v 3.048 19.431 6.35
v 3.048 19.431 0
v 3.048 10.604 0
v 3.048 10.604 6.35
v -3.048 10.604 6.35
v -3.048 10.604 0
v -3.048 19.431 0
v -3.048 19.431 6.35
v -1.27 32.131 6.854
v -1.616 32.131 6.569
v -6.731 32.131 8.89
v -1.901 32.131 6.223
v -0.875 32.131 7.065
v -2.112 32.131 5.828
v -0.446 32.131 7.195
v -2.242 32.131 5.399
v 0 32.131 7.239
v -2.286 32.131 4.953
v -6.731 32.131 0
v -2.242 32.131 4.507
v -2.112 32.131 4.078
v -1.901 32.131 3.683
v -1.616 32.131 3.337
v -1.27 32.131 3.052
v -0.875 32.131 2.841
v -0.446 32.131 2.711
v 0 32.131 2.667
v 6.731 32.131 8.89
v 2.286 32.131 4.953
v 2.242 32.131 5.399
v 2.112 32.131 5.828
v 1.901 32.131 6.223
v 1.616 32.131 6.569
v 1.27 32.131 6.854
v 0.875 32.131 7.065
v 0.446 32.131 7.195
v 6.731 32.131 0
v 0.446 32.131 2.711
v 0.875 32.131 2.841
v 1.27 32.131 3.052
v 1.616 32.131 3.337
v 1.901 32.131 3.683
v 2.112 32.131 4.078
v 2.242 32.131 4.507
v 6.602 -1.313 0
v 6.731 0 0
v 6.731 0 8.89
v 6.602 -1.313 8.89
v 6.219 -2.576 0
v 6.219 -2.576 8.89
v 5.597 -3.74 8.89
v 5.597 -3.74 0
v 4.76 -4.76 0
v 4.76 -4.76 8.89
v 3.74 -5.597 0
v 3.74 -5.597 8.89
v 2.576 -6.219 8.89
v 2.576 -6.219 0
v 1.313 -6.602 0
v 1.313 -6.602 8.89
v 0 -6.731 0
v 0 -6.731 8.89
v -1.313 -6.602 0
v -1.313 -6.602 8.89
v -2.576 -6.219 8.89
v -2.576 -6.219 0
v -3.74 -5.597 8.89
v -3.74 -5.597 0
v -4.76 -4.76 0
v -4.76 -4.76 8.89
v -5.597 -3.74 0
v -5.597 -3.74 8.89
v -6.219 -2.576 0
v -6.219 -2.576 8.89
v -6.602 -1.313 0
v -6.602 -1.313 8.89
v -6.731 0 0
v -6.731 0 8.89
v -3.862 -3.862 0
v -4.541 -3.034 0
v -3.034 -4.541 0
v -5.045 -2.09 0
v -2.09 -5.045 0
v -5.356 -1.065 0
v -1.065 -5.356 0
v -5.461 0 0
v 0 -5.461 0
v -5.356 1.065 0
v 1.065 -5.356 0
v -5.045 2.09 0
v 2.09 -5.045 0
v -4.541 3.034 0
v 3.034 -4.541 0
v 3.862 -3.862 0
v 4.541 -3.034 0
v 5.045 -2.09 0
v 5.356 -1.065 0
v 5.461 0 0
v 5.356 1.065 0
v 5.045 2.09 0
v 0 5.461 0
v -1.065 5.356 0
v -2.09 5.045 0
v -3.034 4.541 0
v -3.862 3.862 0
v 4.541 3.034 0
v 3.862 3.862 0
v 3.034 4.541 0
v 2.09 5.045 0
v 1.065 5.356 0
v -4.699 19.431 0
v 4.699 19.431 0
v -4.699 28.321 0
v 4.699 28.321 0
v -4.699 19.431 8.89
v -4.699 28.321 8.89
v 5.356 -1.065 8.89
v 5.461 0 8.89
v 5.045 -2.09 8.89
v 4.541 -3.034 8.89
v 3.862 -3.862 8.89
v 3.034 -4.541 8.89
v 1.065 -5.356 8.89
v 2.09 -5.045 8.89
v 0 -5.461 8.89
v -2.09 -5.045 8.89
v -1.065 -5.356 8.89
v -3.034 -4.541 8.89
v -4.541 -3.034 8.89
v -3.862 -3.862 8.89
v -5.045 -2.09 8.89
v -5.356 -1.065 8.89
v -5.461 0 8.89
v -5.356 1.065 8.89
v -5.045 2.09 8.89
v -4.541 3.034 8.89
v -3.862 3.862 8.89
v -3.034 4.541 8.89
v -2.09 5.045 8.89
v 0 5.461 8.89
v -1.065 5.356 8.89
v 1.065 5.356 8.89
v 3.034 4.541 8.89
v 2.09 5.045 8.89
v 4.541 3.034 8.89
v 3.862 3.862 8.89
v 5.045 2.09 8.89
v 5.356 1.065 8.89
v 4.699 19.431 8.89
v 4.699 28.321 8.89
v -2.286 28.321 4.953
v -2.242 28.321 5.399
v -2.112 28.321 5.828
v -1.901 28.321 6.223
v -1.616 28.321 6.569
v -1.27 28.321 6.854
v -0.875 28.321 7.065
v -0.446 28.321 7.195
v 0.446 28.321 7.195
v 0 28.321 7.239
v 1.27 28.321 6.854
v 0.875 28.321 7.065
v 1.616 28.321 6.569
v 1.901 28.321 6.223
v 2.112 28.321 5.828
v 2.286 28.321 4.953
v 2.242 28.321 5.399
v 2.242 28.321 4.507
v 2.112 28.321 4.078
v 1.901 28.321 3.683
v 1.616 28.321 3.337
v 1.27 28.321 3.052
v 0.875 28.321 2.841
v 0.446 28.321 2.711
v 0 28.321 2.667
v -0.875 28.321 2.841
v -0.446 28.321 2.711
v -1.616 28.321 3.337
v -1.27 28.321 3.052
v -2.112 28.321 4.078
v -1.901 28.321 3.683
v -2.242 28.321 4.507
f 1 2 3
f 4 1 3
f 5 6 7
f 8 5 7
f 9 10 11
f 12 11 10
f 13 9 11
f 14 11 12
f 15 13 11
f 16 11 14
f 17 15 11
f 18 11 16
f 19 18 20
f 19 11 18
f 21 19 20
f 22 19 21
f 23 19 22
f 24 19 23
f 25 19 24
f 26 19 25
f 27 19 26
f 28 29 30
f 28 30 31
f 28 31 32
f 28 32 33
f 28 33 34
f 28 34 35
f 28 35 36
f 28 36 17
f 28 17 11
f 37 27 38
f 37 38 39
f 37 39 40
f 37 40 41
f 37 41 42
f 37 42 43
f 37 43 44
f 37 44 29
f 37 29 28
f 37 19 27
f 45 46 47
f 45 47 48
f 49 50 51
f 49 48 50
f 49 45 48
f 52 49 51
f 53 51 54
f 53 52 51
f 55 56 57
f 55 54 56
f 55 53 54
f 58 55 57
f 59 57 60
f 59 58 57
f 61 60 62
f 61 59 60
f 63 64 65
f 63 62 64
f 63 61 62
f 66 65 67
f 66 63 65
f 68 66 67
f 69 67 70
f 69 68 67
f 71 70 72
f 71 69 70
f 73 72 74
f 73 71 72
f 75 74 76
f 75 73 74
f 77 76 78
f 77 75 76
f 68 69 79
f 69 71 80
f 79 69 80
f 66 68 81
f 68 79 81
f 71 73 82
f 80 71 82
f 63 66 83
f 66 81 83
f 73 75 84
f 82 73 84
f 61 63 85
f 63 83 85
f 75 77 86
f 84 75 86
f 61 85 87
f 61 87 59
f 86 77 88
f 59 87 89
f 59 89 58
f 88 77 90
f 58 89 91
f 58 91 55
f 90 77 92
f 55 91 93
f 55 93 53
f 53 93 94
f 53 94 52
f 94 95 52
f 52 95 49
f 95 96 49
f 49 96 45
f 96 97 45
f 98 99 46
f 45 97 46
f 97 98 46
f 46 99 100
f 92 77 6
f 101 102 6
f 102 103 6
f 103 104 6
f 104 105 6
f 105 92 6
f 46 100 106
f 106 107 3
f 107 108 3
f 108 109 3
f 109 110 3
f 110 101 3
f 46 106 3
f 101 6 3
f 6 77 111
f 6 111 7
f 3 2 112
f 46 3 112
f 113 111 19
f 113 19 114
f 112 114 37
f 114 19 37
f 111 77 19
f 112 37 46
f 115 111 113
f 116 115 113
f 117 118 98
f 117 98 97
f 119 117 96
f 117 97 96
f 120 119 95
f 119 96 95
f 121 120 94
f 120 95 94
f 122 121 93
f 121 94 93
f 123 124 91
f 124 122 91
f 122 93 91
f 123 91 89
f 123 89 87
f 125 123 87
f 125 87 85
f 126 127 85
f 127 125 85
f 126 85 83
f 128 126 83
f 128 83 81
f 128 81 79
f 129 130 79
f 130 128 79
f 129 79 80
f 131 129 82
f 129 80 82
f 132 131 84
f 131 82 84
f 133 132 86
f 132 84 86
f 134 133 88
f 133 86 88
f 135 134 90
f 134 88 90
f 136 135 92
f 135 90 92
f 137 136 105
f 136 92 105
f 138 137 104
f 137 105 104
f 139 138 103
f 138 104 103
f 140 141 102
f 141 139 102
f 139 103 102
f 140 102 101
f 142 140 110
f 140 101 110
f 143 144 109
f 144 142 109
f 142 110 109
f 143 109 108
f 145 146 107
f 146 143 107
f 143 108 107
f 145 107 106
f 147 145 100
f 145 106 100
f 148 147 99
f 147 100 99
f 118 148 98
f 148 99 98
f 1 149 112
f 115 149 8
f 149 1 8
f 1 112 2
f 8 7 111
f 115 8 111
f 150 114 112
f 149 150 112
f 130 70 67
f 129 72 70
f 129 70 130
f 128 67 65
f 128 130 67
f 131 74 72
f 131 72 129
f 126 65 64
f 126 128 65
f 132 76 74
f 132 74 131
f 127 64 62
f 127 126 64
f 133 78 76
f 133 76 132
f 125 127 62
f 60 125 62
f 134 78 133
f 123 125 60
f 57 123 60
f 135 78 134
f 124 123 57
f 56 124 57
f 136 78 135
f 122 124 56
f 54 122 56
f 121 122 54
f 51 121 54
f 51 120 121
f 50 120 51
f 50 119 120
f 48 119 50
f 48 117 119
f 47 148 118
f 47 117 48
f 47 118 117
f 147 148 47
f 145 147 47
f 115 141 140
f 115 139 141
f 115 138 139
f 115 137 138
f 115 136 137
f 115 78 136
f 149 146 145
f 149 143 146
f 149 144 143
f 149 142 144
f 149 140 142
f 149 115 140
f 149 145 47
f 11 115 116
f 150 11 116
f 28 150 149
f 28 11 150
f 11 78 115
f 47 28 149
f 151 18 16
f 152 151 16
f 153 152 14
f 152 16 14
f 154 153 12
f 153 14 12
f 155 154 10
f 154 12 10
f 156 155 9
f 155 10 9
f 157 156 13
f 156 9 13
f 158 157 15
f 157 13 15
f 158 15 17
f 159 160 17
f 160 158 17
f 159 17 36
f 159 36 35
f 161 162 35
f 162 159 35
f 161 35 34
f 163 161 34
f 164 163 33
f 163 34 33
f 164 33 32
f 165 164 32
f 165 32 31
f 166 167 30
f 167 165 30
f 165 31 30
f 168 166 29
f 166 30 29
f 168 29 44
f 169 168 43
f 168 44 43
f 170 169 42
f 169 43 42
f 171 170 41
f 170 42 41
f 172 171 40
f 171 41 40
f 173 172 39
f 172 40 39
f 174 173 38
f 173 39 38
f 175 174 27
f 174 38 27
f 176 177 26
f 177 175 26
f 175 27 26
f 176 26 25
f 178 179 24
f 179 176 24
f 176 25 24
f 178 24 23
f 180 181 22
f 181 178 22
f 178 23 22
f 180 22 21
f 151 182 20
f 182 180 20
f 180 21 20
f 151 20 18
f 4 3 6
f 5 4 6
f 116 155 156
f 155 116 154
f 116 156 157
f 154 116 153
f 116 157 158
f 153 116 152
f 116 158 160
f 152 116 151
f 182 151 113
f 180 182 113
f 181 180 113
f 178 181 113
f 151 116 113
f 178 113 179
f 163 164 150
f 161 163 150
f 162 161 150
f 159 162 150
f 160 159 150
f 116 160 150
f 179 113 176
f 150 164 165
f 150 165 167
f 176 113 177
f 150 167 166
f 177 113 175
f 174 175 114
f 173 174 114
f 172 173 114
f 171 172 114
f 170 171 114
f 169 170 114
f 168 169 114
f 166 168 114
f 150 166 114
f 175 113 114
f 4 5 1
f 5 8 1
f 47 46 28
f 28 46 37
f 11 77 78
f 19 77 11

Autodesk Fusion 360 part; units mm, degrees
sketch "Sketch1" plane through (0, 0, 0) normal (0, 0, 1) x (1, 0, 0)
  circle A0 centre (0, 0) radius 5.461
  line L0 (-6.731, 0) -> (-6.731, 32.131)
  line L1 (6.731, 0) -> (6.731, 32.131)
  line L2 (4.699, 19.431) -> (-4.699, 19.431)
  line L3 (-4.699, 19.431) -> (-4.699, 28.321)
  line L4 (-4.699, 28.321) -> (4.699, 28.321)
  line L5 (4.699, 28.321) -> (4.699, 19.431)
  line L6 (4.699, 19.431) -> (-4.699, 28.321) construction
  line L7 (-4.699, 19.431) -> (4.699, 28.321) construction
  line L8 (-6.731, 32.131) -> (6.731, 32.131)
  arc A1 (-6.731, 0) -> (6.731, 0) centre (0, 0) ccw
  point P0 (0, 23.876)
  point P1 (0, 6.731)
  dimension "d1" = 10.922
  dimension "d2" = 13.462
  dimension "d5" = 9.398
  dimension "d6" = 8.89
  dimension "d7" = 12.7
  dimension "d8" = 3.81
extrude "Extrude1" add sketch "Sketch1" along normal blind 8.89
sketch "Sketch3" plane through (0, 32.131, 0) normal (0, 1, 0) x (-1, 0, 0)
  line L0 (-6.731, 0) -> (6.731, 0)
  line L1 (6.731, 0) -> (6.731, 8.89)
  line L2 (6.731, 8.89) -> (-6.731, 8.89)
  line L3 (-6.731, 8.89) -> (-6.731, 0)
  line L4 (0, 8.89) -> (0, 7.239)
  circle A0 centre (0, 4.953) radius 2.286
  dimension "d12" = 1.651
  dimension "d13" = 4.572
extrude "Extrude2" cut sketch "Sketch3" against normal blind 5.842 contours A0
sketch "Sketch4" plane through (0, 0, 8.89) normal (0, 0, 1) x (-1, 0, 0)
  circle A0 centre (0, 0) radius 5.461
  line L0 (4.699, -28.321) -> (-4.699, -28.321)
  line L1 (-4.699, -28.321) -> (-4.699, -19.431)
  line L2 (-4.699, -19.431) -> (4.699, -19.431)
  line L3 (4.699, -19.431) -> (4.699, -28.321)
  line L4 (6.731, -32.131) -> (6.731, 0)
  arc A1 (6.731, 0) -> (-6.731, 0) centre (0, 0) ccw
  line L5 (-6.731, 0) -> (-6.731, -32.131)
  line L6 (-6.731, -32.131) -> (6.731, -32.131)
sketch "Sketch5" plane through (0, 0, 0) normal (0, 0, 1) x (1, 0, 0)
  line L0 (-3.048, 20.6883) -> (3.048, 20.6883)
  line L1 (3.048, 20.6883) -> (3.048, 10.6044)
  line L2 (3.048, 10.6044) -> (-3.048, 10.6044)
  line L3 (-3.048, 10.6044) -> (-3.048, 20.6883)
  point P0 (0, 10.6044)
  dimension "d18" = 6.096
extrude "Extrude3" cut sketch "Sketch5" along normal blind 6.35
